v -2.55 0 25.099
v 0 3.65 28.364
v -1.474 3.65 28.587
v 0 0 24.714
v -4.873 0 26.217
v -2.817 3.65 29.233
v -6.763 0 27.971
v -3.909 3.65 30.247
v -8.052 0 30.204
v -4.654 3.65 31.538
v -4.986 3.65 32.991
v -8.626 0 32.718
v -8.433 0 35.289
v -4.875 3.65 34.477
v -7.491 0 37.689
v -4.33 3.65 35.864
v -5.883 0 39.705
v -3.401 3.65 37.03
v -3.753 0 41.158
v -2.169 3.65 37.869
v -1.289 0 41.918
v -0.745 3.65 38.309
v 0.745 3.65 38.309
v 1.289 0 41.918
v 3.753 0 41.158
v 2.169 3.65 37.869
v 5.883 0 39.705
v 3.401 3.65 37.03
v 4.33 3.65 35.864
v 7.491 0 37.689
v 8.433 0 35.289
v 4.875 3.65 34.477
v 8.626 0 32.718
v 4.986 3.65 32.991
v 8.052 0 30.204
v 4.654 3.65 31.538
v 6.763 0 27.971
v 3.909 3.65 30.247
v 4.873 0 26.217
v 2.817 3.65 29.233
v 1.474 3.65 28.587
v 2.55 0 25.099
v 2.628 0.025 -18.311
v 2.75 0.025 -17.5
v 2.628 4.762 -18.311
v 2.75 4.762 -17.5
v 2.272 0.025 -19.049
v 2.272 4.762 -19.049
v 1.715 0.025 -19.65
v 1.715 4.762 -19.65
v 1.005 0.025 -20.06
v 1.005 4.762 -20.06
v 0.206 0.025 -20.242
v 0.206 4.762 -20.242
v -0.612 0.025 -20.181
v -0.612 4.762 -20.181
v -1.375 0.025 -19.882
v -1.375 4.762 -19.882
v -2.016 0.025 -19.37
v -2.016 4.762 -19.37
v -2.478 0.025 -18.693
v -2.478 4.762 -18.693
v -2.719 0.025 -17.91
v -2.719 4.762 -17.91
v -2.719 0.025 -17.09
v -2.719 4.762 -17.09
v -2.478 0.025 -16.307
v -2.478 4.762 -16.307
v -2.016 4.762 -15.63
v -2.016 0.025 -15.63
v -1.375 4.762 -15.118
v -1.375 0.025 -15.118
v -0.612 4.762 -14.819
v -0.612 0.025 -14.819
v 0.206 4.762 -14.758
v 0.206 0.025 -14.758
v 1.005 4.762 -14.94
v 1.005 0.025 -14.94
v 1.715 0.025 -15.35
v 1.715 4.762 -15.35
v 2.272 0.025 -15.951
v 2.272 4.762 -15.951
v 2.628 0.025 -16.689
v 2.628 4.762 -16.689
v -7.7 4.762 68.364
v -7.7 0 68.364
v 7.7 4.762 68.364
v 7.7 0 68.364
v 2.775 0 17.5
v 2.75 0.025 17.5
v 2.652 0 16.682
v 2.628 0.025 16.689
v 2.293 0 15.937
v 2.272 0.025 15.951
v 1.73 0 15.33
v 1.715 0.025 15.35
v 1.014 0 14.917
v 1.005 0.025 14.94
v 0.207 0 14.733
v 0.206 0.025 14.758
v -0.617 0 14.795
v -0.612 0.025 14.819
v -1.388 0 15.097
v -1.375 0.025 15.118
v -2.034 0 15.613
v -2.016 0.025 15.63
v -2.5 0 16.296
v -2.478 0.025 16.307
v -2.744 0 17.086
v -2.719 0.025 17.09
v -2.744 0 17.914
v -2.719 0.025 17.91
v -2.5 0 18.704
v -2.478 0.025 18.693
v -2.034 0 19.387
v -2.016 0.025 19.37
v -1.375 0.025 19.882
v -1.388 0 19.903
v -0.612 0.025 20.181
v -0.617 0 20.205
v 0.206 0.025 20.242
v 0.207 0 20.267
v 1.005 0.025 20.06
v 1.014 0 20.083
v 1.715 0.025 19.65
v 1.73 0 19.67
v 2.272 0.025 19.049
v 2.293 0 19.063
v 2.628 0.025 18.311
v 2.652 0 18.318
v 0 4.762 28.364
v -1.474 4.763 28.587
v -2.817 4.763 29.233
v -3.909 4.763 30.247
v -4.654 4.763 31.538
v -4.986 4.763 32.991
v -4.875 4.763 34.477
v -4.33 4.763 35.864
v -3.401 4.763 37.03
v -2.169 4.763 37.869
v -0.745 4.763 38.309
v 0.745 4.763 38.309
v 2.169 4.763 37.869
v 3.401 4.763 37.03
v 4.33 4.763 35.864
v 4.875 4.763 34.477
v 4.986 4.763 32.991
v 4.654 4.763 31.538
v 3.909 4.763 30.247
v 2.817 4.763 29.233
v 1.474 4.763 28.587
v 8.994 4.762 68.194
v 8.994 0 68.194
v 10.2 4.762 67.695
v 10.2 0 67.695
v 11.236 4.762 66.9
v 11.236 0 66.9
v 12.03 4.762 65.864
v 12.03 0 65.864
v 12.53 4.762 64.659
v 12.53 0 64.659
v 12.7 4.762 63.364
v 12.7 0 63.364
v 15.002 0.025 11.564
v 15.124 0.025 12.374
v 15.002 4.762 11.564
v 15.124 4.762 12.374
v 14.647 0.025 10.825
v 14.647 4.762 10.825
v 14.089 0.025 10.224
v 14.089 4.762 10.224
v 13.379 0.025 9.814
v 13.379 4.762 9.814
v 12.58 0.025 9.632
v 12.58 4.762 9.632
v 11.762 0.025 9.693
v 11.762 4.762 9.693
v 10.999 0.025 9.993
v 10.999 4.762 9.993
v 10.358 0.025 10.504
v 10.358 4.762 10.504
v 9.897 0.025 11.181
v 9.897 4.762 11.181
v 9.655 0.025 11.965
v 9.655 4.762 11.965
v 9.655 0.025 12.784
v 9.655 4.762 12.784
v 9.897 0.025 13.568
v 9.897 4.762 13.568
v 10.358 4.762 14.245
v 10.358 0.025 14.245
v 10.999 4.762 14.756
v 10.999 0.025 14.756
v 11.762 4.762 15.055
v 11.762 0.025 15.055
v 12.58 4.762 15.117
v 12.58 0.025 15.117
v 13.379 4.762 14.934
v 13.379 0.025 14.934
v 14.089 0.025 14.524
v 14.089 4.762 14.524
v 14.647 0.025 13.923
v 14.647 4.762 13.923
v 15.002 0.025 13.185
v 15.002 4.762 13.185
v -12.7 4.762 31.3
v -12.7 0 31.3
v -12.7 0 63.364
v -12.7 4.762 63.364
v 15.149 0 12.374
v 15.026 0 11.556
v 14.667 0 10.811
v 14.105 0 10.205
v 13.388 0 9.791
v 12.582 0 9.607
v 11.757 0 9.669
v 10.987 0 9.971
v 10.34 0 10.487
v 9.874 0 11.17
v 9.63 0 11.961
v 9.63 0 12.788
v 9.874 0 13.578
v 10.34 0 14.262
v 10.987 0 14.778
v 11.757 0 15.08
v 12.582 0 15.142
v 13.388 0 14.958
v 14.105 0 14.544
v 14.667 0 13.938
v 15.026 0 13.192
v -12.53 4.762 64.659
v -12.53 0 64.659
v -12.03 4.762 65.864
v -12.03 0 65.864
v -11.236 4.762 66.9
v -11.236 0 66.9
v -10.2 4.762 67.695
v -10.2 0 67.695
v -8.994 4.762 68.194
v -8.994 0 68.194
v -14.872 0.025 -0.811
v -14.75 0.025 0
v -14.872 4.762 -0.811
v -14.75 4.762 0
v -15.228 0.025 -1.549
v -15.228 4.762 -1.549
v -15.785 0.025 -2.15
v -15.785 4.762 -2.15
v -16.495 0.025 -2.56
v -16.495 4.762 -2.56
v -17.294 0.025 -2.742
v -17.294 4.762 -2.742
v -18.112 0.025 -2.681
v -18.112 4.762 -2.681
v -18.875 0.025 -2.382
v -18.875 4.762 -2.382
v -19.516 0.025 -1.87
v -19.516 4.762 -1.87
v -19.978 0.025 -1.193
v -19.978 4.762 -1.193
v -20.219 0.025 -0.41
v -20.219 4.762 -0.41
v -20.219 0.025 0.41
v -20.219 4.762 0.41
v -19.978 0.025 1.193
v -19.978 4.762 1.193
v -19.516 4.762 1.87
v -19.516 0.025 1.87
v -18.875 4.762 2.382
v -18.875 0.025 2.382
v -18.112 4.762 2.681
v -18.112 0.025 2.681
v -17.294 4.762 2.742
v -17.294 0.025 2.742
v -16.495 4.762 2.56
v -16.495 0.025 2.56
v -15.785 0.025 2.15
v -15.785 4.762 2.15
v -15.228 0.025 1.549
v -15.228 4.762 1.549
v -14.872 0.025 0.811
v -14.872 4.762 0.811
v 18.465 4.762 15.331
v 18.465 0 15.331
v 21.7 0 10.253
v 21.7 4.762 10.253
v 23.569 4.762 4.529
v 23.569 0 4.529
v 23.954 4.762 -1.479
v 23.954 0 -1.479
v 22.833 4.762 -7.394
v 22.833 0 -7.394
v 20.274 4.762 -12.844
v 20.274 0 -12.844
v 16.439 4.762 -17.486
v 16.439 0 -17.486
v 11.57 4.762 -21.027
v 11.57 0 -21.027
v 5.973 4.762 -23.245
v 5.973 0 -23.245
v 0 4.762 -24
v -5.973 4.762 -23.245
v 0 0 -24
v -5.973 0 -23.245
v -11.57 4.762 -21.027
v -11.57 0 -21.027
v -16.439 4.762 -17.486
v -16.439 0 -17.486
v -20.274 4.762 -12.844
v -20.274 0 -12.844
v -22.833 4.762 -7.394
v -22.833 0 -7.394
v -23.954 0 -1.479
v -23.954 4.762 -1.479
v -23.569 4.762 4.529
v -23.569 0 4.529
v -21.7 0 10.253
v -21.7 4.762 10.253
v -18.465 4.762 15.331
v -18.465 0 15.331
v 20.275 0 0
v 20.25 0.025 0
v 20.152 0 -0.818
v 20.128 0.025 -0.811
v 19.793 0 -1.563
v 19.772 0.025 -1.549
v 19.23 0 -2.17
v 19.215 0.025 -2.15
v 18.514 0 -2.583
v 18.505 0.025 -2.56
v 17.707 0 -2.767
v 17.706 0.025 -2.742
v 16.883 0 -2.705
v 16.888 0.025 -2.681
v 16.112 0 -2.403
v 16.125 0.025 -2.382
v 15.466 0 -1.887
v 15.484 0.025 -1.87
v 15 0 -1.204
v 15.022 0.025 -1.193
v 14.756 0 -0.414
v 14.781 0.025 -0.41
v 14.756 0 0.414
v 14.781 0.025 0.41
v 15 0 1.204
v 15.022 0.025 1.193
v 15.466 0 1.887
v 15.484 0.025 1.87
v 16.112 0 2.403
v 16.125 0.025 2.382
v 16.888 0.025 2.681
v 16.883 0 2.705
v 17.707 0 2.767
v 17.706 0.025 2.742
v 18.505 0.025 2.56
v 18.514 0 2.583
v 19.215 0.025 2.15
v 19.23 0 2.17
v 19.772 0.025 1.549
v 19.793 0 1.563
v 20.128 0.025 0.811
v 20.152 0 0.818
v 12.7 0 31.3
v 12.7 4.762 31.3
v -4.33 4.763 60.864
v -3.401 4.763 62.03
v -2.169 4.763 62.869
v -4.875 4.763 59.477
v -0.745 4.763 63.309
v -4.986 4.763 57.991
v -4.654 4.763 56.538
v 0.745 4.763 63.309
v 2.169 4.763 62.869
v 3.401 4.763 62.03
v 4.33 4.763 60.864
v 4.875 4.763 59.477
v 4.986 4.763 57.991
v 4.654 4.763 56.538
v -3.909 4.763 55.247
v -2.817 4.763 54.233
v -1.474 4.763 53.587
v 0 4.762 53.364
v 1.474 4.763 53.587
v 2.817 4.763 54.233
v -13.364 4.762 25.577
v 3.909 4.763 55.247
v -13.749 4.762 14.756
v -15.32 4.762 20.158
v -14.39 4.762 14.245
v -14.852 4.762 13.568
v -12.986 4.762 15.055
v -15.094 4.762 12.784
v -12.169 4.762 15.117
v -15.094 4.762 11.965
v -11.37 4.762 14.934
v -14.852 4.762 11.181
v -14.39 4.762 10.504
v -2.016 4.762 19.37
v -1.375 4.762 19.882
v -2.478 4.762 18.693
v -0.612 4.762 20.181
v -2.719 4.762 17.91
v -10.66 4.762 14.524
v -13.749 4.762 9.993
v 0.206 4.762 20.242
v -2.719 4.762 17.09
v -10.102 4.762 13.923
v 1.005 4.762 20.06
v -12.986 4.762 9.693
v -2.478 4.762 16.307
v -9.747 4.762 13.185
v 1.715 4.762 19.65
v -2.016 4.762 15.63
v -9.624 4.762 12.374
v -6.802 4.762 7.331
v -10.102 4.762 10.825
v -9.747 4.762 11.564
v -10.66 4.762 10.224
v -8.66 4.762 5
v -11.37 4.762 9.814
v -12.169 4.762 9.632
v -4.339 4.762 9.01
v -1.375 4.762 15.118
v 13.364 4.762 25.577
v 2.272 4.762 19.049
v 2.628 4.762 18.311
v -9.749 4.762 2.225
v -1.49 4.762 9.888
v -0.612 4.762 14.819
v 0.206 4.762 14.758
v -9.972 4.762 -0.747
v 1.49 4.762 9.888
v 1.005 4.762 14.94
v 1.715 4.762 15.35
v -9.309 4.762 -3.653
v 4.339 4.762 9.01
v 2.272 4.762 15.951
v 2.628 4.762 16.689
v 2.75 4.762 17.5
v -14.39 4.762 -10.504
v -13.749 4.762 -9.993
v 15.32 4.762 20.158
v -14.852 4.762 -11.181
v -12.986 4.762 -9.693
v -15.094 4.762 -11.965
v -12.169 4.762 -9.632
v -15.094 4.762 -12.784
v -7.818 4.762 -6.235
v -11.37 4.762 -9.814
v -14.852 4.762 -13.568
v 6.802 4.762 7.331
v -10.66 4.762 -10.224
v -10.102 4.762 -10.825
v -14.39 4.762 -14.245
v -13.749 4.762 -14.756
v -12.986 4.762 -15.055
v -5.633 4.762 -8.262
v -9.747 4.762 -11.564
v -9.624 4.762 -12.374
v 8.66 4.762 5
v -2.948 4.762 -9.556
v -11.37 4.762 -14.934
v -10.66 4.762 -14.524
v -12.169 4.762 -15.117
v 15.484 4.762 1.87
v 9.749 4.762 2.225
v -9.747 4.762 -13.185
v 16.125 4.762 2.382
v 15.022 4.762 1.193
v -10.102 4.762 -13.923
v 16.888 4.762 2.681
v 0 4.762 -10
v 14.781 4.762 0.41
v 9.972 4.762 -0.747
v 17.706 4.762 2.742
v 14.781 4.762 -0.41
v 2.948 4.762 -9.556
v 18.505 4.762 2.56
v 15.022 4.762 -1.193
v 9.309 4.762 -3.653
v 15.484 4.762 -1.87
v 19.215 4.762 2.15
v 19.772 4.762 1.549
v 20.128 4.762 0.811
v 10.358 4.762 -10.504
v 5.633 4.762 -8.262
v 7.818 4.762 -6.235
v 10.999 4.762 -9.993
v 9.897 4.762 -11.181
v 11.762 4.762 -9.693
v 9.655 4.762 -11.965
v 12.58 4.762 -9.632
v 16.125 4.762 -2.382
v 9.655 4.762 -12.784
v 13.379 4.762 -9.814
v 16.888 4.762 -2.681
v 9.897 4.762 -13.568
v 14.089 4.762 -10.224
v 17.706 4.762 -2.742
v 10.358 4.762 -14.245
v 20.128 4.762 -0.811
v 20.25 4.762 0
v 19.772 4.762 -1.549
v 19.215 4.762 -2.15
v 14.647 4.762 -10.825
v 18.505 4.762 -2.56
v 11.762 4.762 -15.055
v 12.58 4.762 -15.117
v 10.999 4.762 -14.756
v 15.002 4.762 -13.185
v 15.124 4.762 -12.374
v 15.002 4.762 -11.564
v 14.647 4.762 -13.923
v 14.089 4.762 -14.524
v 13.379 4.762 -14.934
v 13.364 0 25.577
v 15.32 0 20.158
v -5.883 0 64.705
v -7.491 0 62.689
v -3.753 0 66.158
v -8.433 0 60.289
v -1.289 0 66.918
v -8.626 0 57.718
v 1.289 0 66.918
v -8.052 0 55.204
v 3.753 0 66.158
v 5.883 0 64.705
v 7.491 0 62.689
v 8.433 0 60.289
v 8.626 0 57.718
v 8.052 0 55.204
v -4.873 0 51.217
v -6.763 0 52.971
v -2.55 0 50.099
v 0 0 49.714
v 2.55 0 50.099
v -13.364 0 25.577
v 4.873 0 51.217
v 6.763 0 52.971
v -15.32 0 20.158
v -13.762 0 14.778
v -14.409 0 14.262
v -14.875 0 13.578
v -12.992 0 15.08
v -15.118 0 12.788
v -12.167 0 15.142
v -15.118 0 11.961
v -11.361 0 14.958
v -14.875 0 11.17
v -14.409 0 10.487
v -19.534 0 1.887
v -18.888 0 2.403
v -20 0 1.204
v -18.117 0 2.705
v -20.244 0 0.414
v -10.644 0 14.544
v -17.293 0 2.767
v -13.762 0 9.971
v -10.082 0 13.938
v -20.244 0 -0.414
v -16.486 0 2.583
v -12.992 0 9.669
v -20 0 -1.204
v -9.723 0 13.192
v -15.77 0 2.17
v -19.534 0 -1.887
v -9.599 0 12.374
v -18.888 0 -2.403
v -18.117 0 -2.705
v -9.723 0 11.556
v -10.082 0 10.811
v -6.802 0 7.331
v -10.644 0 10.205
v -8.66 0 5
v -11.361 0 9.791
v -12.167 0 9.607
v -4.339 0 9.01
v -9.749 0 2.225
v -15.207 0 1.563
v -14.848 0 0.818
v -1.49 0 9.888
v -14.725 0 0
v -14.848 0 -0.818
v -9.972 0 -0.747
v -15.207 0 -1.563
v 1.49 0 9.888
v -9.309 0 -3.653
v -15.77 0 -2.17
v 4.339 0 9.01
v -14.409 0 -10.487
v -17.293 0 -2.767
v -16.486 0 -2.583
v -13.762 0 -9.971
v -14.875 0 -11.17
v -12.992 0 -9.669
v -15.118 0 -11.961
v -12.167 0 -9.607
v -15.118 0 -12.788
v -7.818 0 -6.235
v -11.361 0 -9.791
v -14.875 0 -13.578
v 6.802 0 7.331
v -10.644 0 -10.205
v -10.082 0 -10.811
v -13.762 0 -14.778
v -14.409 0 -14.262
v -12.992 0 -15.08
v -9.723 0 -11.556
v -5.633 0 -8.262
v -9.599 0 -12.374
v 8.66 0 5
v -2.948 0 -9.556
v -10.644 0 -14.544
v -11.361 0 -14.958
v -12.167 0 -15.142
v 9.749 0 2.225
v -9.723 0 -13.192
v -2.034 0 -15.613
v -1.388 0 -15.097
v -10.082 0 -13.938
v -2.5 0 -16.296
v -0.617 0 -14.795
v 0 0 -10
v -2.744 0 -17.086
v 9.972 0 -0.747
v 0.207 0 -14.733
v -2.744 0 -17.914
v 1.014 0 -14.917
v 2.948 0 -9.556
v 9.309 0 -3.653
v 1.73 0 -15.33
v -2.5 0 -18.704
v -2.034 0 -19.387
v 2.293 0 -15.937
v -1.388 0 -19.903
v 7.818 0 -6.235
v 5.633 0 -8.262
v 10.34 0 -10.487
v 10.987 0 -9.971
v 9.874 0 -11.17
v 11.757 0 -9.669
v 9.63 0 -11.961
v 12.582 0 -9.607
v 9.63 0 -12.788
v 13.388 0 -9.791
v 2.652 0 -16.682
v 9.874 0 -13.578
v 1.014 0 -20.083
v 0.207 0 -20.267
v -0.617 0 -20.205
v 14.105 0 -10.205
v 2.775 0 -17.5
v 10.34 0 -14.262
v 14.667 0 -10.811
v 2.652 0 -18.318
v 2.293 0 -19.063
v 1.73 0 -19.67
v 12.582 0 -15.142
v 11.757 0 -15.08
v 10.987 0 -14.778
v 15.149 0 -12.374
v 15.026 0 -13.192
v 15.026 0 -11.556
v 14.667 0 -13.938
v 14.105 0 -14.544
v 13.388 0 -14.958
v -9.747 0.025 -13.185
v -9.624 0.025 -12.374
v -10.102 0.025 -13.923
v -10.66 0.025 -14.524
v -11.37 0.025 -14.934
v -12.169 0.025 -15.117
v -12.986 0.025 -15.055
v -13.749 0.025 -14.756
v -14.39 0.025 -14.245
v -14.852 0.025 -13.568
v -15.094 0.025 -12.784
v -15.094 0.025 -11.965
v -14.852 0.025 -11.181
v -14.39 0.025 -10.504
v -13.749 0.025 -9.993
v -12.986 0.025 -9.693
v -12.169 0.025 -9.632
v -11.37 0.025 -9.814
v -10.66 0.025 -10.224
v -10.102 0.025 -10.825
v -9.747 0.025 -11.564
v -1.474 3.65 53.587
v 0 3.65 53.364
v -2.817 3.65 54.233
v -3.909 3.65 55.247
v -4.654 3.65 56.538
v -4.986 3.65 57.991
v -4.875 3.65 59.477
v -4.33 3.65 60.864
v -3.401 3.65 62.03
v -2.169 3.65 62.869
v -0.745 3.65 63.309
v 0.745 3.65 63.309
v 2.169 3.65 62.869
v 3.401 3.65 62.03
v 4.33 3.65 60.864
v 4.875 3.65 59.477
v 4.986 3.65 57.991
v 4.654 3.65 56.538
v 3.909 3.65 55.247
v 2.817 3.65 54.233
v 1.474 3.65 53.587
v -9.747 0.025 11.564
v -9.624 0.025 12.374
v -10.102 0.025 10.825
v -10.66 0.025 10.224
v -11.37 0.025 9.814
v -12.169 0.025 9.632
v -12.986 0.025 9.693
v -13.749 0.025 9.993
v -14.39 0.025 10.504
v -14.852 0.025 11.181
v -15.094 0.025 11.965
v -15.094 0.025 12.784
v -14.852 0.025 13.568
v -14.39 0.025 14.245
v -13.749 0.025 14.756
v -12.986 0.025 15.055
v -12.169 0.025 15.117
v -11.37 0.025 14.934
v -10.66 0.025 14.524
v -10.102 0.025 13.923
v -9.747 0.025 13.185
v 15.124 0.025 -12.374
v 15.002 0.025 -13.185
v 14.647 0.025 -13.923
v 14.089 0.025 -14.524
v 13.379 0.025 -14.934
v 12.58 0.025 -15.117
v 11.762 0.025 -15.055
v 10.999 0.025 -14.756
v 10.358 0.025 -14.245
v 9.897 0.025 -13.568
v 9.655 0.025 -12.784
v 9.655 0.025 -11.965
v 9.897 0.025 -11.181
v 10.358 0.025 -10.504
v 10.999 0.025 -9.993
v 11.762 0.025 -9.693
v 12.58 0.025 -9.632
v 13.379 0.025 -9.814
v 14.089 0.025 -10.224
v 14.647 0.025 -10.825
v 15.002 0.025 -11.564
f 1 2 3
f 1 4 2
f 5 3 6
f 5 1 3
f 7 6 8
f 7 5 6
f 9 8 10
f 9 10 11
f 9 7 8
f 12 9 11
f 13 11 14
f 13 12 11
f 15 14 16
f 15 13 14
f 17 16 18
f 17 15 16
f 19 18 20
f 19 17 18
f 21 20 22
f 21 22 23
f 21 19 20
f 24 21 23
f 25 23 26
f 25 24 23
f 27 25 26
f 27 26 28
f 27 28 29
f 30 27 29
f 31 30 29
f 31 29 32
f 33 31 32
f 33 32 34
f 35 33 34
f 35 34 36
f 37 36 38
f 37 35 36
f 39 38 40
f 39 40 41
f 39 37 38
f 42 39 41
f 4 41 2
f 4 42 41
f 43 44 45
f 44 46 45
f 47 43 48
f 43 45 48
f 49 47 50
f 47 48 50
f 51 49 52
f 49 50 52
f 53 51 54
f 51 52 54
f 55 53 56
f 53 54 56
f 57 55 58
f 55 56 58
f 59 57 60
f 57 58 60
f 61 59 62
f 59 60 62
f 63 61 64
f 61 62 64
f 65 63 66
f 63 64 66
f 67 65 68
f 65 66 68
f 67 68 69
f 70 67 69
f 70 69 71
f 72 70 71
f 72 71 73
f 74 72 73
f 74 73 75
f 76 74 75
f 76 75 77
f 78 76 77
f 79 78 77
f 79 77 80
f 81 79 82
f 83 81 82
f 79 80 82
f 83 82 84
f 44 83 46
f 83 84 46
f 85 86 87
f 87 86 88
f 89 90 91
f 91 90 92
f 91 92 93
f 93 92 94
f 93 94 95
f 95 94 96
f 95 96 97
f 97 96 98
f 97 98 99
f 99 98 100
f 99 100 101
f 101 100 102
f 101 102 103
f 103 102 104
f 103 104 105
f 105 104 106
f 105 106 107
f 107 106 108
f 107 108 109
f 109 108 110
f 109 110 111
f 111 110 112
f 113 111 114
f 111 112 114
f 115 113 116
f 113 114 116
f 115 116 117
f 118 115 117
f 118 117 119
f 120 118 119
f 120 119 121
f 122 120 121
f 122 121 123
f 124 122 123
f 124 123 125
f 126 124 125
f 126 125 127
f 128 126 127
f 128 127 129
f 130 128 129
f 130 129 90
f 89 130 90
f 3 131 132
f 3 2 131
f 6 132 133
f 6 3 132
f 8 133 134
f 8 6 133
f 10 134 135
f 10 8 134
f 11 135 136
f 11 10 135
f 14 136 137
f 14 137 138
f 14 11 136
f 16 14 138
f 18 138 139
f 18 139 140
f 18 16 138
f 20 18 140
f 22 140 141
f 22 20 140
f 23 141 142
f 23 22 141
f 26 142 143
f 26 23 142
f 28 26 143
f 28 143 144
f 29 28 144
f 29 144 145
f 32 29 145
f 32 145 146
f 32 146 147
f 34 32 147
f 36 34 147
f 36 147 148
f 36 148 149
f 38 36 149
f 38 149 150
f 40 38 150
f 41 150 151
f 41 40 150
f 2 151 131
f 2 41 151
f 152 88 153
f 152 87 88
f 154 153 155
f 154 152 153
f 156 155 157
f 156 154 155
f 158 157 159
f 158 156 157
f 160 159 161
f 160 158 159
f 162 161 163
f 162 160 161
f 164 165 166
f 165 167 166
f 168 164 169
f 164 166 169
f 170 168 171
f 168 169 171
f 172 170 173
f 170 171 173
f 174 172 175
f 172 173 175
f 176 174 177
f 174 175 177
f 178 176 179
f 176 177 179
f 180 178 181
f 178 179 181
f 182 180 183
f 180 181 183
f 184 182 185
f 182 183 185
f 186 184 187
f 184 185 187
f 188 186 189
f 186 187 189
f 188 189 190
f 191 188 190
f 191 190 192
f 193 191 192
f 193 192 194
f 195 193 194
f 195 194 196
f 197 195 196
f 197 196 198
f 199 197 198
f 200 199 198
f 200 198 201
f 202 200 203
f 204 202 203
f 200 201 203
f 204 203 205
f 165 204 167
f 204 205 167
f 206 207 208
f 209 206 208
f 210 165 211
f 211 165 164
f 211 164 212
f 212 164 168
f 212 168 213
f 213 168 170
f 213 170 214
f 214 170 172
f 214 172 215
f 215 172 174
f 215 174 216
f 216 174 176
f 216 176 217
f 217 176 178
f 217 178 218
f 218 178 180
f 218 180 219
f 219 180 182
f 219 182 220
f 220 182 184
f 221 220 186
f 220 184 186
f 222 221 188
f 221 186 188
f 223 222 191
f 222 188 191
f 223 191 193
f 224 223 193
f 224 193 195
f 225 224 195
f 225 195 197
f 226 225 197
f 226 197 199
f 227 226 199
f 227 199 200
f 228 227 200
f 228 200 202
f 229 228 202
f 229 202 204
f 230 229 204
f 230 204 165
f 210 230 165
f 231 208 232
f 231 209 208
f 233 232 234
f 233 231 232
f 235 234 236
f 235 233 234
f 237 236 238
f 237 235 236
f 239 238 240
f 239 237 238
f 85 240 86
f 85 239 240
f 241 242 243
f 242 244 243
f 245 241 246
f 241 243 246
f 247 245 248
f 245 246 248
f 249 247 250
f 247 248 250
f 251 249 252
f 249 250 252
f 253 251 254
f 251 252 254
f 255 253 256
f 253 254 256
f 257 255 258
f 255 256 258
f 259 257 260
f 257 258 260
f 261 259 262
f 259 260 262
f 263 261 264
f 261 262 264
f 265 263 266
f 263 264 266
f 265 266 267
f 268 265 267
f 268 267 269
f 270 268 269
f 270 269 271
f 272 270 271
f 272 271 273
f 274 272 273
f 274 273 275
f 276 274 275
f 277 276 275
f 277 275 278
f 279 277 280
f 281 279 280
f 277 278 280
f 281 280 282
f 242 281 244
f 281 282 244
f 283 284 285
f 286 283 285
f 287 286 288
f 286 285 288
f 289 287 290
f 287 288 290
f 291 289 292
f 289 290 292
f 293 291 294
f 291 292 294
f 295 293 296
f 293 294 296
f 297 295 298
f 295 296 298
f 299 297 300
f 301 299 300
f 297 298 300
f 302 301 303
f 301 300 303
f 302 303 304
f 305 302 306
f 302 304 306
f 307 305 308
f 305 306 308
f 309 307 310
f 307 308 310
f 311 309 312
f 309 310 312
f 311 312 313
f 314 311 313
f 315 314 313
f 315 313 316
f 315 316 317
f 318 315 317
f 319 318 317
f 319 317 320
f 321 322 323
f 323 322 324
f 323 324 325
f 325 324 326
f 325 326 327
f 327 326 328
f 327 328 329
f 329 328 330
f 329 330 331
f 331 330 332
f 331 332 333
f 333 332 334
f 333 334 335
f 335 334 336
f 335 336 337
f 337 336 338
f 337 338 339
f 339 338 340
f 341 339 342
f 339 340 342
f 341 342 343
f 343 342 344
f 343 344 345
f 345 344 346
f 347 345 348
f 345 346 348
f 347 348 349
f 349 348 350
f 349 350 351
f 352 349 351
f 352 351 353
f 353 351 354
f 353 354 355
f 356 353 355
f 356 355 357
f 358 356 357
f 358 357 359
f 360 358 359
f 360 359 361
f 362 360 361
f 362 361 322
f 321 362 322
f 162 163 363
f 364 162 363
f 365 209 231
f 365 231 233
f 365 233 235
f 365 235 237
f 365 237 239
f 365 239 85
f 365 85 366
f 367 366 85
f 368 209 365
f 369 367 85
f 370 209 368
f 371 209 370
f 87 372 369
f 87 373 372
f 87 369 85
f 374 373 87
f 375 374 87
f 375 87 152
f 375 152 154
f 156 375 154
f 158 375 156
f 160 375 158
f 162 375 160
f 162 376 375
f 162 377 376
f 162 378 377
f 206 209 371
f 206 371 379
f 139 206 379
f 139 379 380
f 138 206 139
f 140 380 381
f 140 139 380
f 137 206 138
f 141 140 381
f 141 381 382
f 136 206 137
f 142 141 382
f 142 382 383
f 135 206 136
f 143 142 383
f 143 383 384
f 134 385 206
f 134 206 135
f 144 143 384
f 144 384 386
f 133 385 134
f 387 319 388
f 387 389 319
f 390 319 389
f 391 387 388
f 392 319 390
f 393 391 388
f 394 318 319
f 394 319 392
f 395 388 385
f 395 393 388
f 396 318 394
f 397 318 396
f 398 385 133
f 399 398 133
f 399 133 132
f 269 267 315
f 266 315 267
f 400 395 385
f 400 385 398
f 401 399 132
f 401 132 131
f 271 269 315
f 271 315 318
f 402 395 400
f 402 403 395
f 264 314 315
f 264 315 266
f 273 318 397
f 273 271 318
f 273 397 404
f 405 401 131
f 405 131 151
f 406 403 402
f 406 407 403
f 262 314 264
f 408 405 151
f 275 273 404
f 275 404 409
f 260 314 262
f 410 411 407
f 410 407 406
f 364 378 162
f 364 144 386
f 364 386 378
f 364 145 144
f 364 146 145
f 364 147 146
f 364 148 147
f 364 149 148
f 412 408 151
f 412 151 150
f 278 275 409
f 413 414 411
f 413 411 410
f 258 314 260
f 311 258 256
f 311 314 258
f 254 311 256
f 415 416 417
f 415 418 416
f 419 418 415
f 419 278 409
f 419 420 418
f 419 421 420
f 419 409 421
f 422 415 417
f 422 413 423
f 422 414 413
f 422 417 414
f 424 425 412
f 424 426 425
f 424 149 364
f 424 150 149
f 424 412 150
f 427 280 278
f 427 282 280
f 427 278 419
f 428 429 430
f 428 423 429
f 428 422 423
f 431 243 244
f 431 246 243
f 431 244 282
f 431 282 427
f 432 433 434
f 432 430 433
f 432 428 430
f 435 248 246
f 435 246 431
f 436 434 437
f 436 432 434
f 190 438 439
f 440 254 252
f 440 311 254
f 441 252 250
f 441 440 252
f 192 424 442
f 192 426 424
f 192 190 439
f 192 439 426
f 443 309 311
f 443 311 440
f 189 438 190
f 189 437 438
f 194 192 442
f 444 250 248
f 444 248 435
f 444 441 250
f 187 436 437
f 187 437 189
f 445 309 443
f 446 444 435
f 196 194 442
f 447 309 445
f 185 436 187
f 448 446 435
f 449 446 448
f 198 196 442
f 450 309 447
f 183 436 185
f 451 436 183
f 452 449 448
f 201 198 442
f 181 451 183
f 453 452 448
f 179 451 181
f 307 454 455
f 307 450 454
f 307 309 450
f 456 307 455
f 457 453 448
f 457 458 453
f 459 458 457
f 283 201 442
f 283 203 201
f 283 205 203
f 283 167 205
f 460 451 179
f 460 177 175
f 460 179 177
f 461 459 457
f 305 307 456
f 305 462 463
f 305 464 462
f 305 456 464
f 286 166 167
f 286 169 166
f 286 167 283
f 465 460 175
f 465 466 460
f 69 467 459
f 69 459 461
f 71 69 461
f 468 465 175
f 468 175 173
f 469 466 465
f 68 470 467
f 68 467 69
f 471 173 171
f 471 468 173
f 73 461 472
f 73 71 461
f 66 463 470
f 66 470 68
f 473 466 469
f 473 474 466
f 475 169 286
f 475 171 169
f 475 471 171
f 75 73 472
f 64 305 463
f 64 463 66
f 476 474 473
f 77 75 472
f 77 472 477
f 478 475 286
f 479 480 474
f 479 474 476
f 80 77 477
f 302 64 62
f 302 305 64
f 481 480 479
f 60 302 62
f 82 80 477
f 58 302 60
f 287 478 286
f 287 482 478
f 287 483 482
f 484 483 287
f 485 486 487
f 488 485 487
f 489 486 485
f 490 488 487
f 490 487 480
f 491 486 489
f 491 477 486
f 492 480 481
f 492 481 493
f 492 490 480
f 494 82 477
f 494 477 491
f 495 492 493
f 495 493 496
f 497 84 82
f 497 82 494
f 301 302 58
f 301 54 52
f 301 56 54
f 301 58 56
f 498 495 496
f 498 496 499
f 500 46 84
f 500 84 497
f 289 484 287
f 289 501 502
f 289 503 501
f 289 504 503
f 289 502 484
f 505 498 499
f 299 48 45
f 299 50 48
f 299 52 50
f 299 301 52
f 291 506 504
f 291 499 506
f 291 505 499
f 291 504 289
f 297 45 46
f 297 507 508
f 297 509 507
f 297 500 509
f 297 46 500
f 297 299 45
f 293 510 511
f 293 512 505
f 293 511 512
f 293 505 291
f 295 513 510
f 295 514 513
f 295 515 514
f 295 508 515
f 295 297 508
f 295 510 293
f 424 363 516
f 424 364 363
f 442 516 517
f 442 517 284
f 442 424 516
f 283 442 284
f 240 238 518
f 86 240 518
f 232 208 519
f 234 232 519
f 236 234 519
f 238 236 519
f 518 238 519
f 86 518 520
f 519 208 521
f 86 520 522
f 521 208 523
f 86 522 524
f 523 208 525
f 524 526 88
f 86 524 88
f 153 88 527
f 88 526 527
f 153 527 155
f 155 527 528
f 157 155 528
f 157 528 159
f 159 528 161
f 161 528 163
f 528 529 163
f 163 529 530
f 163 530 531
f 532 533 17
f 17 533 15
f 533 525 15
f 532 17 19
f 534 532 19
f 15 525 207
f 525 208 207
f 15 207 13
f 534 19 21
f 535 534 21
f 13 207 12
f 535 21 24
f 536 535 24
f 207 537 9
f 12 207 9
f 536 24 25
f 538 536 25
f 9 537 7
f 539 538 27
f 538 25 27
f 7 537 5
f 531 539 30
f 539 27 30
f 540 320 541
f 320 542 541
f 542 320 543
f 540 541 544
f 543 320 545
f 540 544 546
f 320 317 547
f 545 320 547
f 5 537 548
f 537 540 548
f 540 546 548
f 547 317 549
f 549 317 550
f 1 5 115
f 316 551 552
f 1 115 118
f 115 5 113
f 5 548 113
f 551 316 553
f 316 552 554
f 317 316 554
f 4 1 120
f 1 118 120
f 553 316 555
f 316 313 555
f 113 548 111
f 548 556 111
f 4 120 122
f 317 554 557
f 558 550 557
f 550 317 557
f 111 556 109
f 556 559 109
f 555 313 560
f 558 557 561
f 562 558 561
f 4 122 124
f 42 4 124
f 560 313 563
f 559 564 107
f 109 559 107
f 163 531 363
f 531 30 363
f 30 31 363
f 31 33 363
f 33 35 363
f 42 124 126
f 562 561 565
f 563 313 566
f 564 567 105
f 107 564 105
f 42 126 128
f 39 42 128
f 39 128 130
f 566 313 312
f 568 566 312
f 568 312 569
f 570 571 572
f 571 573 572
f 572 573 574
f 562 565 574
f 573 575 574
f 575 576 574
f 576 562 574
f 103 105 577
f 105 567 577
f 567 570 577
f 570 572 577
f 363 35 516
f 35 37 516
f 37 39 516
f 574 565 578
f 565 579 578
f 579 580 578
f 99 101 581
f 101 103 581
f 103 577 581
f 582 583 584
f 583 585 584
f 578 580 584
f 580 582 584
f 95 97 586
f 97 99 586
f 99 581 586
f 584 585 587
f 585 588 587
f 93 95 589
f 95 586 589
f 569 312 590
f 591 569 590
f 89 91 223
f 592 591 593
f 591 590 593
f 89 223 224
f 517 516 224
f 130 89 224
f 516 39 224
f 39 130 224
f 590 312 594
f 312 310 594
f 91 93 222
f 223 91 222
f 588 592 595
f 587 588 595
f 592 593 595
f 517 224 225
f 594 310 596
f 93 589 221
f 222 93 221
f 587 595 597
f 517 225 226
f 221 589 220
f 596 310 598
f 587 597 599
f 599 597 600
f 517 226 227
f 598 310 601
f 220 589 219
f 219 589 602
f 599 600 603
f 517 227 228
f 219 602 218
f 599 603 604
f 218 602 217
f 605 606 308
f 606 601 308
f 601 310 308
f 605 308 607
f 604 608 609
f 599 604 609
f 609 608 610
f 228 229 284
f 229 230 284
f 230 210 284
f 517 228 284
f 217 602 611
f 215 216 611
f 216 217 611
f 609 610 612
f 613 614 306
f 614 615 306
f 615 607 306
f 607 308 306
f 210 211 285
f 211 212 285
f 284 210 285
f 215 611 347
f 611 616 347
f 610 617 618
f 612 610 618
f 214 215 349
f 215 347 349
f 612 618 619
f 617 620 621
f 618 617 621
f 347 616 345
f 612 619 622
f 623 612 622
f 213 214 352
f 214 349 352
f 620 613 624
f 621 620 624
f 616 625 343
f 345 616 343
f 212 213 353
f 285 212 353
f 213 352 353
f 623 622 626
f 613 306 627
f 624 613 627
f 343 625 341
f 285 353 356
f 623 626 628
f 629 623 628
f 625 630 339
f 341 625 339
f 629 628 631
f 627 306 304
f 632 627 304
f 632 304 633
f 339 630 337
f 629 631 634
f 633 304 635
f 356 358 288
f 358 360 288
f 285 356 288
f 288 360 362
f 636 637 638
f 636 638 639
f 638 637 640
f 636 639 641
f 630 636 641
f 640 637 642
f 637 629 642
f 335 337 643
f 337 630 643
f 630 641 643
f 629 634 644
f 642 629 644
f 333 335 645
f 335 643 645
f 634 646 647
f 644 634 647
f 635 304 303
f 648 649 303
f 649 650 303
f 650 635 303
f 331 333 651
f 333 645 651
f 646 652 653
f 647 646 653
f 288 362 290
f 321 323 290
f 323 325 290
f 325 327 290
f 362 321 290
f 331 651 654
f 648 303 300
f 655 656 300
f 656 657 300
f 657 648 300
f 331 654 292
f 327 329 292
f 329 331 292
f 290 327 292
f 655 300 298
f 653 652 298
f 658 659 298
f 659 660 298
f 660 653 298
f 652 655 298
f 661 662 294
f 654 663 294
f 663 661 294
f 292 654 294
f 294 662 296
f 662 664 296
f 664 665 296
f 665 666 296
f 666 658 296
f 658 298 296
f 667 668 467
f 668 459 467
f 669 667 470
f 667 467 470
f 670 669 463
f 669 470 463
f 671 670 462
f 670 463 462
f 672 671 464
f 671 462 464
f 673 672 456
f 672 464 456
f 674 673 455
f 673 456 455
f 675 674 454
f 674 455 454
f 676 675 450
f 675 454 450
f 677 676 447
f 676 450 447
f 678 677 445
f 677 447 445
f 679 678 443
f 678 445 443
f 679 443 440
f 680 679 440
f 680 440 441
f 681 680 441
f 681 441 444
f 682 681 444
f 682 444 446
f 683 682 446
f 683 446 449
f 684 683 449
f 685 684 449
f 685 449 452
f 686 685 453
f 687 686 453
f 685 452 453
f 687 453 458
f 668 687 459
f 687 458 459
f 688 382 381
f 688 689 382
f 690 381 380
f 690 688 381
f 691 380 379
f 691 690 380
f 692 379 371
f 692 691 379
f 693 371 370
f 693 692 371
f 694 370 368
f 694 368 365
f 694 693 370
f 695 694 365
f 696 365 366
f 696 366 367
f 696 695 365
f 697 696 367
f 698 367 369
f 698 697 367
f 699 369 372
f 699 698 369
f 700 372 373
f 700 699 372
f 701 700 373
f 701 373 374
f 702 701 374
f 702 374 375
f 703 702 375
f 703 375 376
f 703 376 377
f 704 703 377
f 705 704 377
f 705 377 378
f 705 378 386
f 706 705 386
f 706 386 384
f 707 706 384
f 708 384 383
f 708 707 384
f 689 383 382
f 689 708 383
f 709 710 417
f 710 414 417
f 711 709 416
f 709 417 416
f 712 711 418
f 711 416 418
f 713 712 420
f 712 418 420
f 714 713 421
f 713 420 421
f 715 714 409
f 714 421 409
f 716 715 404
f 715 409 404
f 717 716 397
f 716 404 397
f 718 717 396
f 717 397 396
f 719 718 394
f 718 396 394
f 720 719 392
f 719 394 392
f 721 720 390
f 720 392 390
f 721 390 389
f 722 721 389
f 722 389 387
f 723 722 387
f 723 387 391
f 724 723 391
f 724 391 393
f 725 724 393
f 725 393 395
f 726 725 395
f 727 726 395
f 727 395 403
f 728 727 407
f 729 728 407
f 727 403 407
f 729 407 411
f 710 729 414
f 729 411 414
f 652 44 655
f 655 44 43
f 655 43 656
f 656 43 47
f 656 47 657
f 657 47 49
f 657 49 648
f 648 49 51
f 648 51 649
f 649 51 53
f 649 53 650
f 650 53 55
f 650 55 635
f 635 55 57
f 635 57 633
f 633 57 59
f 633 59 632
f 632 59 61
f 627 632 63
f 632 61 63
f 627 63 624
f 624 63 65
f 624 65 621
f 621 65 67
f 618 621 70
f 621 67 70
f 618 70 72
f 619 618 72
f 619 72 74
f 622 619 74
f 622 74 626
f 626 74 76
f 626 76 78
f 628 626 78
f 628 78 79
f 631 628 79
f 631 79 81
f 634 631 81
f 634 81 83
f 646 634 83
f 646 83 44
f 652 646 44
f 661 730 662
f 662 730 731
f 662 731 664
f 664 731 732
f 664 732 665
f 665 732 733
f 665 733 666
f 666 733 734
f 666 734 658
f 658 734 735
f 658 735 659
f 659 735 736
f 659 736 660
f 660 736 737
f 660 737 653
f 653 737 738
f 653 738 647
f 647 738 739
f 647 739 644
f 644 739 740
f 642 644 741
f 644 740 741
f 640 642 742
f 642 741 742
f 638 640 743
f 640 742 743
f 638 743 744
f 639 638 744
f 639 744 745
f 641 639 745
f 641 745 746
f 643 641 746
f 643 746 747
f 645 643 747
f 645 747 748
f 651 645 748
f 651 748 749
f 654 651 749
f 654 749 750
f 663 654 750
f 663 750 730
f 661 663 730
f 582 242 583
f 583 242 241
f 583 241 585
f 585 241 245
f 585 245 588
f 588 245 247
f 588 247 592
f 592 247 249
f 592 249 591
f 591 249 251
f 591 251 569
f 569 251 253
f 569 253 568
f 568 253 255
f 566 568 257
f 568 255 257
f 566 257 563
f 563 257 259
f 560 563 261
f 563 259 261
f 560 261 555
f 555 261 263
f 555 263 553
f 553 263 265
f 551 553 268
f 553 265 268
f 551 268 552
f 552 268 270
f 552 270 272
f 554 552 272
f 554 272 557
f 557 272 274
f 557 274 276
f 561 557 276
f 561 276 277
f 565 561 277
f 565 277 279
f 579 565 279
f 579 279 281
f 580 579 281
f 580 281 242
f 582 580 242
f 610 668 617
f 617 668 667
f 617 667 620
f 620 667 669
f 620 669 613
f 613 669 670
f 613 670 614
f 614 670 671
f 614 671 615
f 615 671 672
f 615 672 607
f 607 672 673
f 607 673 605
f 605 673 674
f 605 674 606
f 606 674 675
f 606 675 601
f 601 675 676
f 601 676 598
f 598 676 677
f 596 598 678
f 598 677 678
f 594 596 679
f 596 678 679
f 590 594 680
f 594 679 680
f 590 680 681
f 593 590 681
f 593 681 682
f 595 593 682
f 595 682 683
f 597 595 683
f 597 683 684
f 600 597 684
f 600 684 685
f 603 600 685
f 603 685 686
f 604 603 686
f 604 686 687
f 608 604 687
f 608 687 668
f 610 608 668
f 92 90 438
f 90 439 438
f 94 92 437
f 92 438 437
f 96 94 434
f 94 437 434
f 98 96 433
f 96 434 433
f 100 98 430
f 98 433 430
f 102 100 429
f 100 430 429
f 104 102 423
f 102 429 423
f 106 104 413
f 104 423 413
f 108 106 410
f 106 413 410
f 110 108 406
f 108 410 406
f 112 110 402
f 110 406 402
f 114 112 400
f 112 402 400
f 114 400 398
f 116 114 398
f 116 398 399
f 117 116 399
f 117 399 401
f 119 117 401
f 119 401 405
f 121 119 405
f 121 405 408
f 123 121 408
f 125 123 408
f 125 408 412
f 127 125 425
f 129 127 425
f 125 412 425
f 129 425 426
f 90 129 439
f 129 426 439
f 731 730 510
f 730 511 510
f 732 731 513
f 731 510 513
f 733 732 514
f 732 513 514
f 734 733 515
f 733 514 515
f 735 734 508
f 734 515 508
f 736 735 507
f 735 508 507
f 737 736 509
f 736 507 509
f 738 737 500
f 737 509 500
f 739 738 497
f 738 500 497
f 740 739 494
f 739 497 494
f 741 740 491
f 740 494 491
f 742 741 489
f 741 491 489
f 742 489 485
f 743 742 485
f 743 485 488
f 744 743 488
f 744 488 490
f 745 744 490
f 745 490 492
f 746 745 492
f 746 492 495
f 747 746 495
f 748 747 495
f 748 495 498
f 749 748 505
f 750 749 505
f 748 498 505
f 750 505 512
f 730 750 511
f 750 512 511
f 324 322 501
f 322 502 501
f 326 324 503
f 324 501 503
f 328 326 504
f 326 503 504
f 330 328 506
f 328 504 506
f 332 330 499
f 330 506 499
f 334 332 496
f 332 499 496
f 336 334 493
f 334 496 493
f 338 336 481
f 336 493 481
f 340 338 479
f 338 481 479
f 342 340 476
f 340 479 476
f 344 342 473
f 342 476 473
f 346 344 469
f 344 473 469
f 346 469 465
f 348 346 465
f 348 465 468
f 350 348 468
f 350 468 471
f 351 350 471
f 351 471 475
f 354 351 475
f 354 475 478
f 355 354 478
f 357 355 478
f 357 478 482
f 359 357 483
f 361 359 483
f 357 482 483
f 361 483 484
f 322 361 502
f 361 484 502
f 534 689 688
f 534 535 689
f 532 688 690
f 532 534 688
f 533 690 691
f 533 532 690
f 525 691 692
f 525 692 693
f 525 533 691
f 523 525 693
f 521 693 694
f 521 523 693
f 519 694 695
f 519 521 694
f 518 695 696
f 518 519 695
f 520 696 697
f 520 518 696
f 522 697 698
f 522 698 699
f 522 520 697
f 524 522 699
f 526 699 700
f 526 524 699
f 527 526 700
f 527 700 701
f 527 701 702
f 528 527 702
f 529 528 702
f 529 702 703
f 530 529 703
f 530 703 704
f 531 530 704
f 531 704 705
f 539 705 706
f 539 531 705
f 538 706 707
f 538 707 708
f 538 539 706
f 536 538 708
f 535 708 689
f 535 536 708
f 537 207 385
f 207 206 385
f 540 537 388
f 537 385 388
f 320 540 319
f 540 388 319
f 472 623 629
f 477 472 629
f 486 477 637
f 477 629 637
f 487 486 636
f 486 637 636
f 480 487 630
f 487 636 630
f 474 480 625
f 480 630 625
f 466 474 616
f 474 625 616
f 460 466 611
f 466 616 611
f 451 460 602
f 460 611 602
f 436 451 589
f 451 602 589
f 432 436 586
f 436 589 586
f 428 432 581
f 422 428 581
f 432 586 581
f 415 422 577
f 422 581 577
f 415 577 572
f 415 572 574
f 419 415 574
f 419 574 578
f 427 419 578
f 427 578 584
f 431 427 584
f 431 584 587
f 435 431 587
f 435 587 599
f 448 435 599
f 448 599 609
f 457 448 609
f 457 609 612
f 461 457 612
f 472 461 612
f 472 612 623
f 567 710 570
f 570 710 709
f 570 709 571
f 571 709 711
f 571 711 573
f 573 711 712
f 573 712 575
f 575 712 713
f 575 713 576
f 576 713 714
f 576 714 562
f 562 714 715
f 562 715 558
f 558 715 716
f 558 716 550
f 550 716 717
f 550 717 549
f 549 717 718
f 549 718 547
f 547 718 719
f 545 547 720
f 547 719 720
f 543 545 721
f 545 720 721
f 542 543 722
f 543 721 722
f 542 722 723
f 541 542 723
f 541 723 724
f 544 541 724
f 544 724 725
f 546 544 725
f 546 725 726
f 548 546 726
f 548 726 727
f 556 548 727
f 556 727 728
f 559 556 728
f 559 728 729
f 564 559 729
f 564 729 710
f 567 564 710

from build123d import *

# Parameters (mm, degrees)
BOSS_EXTRUDE1_DEPTH                            = 4.7625
M5_CLEARANCE_HOLE1_D                           = 5.5
M5_CLEARANCE_HOLE1_CSINK_D                     = 5.55
M5_CLEARANCE_HOLE1_CSINK_ANGLE                 = 90
SKETCH5_R                                      = 10
CUT_EXTRUDE1_DEPTH                             = 73.611133199
CSK_FOR_M8_FLAT_HEAD_MACHINE_SCREW1_AT_2_COUNT = 2
CSK_FOR_M8_FLAT_HEAD_MACHINE_SCREW1_AT_2_PITCH = 25
FILLET1_R                                      = 25
FILLET2_R                                      = 5


with BuildPart() as part:
    # Sketch1 → Boss-Extrude1 (new body)
    with BuildSketch(Plane(origin=(0, 0, 0), x_dir=(1, 0, 0), z_dir=(0, 1, 0))):
        with BuildLine():
            Line((-12.7, -68.364429774), (12.7, -68.364429774))
            Line((12.7, -68.364429774), (12.7, -20.364429774))
            ThreePointArc((12.7, -20.364429774), (0, 24), (-12.7, -20.364429774))
            Line((-12.7, -20.364429774), (-12.7, -68.364429774))
        make_face()
    extrude(amount=BOSS_EXTRUDE1_DEPTH)

    # M5 Clearance Hole1 (through all)
    with Locations(Plane(origin=(0, 0, 0), x_dir=(-1, 0, 0), z_dir=(0, -1, 0))):
        with Locations((0, 17.5), (12.374368671, 12.374368671), (17.5, 0), (12.374368671, -12.374368671), (0, -17.5), (-12.374368671, -12.374368671), (-17.5, 0), (-12.374368671, 12.374368671)):
            CounterSinkHole(M5_CLEARANCE_HOLE1_D / 2, M5_CLEARANCE_HOLE1_CSINK_D / 2, counter_sink_angle=M5_CLEARANCE_HOLE1_CSINK_ANGLE)

    # Sketch5 → Cut-Extrude1 (cut, through all)
    with BuildSketch(Plane.XZ):
        with Locations(Location((0, 0, 0), (0, 0, 270))):
            Circle(SKETCH5_R)
    extrude(amount=-CUT_EXTRUDE1_DEPTH, mode=Mode.SUBTRACT)

    # Sketch8 → CSK for M8 Flat Head Machine Screw1 (revolve, cut)
    with BuildSketch(Plane(origin=(0, 0, 33.364429774), x_dir=(0, 0, -1), z_dir=(1, 0, 0))):
        Polygon((0, 0), (0, 4.7625), (5, 4.7625), (5, 3.65), (8.65, 0), align=None)
    csk_for_m8_flat_head_machine_screw1 = revolve(axis=Axis((0, -6.35, 33.364429774), (0, 1, 0)), mode=Mode.SUBTRACT)

    # CSK for M8 Flat Head Machine Screw1 at 2: CSK for M8 Flat Head Machine Screw1 ×2
    with Locations(*[(0, 0, i * CSK_FOR_M8_FLAT_HEAD_MACHINE_SCREW1_AT_2_PITCH) for i in range(1, CSK_FOR_M8_FLAT_HEAD_MACHINE_SCREW1_AT_2_COUNT)]):
        add(csk_for_m8_flat_head_machine_screw1, mode=Mode.SUBTRACT)

    # Fillet1
    fillet1_edges = [part.edges().sort_by_distance(p)[0] for p in [
        (-12.7, 2.38125, 20.364429774),
        (12.7, 2.38125, 20.364429774),
    ]]
    fillet(fillet1_edges, radius=FILLET1_R)

    # Fillet2
    fillet2_edges = [part.edges().sort_by_distance(p)[0] for p in [
        (12.7, 2.38125, 68.364429774),
        (-12.7, 2.38125, 68.364429774),
    ]]
    fillet(fillet2_edges, radius=FILLET2_R)


solid = part.part
